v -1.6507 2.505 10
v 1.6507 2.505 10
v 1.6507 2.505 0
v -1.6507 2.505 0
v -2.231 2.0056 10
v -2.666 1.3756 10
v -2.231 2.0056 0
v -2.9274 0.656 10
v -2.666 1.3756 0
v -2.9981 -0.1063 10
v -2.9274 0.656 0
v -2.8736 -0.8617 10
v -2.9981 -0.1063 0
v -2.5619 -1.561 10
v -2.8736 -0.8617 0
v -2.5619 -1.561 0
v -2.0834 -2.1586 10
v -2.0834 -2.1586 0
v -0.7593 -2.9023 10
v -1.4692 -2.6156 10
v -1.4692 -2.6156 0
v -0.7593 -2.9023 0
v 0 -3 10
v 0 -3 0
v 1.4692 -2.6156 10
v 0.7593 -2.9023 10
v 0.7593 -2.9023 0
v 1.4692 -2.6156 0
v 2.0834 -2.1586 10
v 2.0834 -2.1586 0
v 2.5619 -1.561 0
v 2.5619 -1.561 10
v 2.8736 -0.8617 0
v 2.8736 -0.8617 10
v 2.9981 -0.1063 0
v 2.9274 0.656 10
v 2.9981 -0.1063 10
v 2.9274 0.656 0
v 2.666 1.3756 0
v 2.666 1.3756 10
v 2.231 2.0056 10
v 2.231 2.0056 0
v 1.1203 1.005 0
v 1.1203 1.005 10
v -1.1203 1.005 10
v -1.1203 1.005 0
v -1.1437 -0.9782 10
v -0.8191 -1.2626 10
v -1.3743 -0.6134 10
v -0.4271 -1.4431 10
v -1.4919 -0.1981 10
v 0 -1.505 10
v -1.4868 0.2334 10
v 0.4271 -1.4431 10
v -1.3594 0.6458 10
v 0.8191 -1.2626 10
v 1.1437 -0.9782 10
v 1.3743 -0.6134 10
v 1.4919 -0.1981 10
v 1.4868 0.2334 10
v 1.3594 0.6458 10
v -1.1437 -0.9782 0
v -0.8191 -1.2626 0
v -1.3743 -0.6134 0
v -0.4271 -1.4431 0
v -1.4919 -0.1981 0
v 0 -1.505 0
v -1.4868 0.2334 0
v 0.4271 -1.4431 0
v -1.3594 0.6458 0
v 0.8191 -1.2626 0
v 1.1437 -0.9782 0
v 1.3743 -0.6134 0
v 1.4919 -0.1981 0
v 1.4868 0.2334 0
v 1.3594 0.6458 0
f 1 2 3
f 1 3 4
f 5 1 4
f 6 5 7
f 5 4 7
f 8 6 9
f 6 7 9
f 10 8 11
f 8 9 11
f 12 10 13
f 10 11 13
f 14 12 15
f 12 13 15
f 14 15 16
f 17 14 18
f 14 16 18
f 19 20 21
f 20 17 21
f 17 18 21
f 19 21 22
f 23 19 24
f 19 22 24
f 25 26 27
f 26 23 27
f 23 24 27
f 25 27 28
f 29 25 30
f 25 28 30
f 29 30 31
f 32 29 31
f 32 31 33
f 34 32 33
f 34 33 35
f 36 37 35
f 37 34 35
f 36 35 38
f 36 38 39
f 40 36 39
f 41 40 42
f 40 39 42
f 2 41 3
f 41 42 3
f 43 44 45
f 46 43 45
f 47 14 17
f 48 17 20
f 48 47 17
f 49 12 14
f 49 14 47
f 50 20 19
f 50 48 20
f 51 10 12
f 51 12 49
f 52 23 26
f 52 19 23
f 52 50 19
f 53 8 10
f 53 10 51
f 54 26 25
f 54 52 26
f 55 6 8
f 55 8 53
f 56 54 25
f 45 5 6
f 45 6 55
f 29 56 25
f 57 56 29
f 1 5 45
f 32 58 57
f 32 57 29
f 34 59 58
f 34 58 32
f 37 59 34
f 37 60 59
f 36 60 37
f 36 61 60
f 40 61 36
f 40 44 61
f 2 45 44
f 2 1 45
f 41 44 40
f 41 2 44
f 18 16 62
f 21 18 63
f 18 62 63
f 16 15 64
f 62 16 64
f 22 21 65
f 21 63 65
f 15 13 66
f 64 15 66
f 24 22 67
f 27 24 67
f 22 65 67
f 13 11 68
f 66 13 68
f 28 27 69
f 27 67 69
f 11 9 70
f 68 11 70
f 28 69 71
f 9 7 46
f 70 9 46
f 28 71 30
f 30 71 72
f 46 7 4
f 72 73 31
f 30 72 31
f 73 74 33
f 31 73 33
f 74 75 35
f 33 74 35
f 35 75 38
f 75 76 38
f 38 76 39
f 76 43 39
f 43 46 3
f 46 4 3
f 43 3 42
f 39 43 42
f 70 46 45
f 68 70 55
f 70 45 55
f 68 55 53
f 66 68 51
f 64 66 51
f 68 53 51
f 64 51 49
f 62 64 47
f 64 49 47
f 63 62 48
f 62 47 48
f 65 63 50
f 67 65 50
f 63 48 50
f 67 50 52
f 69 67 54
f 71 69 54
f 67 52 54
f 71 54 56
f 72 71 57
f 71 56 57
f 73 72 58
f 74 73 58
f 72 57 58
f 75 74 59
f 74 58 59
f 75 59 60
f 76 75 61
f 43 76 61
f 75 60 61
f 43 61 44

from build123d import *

# Parameters (mm, degrees)
SKETCH_1_R          = 3
EXTRUDE_1_DEPTH     = 10
CUT_EXTRUDE_1_DEPTH = 10
CUT_EXTRUDE_2_DEPTH = 10


with BuildPart() as part:
    # 草图1 → 凸台-拉伸1 (new body)
    with BuildSketch(Plane.XY):
        Circle(SKETCH_1_R)
    extrude(amount=EXTRUDE_1_DEPTH)

    # 草图2 → 切除-拉伸1 (cut)
    with BuildSketch(Plane.XY.offset(10)):
        with BuildLine():
            Line((1.120267825, 1.005), (-1.120267825, 1.005))
            ThreePointArc((-1.120267825, 1.005), (0, -1.505), (1.120267825, 1.005))
        make_face()
    extrude(amount=-CUT_EXTRUDE_1_DEPTH, mode=Mode.SUBTRACT)

    # 草图3 → 切除-拉伸2 (cut)
    with BuildSketch(Plane(origin=(0, 0, 0), x_dir=(-1, 0, 0), z_dir=(0, 0, -1))):
        with BuildLine():
            Line((-1.65074983, 2.505), (1.65074983, 2.505))
            ThreePointArc((1.65074983, 2.505), (0, 3), (-1.65074983, 2.505))
        make_face()
    extrude(amount=-CUT_EXTRUDE_2_DEPTH, mode=Mode.SUBTRACT)


solid = part.part
